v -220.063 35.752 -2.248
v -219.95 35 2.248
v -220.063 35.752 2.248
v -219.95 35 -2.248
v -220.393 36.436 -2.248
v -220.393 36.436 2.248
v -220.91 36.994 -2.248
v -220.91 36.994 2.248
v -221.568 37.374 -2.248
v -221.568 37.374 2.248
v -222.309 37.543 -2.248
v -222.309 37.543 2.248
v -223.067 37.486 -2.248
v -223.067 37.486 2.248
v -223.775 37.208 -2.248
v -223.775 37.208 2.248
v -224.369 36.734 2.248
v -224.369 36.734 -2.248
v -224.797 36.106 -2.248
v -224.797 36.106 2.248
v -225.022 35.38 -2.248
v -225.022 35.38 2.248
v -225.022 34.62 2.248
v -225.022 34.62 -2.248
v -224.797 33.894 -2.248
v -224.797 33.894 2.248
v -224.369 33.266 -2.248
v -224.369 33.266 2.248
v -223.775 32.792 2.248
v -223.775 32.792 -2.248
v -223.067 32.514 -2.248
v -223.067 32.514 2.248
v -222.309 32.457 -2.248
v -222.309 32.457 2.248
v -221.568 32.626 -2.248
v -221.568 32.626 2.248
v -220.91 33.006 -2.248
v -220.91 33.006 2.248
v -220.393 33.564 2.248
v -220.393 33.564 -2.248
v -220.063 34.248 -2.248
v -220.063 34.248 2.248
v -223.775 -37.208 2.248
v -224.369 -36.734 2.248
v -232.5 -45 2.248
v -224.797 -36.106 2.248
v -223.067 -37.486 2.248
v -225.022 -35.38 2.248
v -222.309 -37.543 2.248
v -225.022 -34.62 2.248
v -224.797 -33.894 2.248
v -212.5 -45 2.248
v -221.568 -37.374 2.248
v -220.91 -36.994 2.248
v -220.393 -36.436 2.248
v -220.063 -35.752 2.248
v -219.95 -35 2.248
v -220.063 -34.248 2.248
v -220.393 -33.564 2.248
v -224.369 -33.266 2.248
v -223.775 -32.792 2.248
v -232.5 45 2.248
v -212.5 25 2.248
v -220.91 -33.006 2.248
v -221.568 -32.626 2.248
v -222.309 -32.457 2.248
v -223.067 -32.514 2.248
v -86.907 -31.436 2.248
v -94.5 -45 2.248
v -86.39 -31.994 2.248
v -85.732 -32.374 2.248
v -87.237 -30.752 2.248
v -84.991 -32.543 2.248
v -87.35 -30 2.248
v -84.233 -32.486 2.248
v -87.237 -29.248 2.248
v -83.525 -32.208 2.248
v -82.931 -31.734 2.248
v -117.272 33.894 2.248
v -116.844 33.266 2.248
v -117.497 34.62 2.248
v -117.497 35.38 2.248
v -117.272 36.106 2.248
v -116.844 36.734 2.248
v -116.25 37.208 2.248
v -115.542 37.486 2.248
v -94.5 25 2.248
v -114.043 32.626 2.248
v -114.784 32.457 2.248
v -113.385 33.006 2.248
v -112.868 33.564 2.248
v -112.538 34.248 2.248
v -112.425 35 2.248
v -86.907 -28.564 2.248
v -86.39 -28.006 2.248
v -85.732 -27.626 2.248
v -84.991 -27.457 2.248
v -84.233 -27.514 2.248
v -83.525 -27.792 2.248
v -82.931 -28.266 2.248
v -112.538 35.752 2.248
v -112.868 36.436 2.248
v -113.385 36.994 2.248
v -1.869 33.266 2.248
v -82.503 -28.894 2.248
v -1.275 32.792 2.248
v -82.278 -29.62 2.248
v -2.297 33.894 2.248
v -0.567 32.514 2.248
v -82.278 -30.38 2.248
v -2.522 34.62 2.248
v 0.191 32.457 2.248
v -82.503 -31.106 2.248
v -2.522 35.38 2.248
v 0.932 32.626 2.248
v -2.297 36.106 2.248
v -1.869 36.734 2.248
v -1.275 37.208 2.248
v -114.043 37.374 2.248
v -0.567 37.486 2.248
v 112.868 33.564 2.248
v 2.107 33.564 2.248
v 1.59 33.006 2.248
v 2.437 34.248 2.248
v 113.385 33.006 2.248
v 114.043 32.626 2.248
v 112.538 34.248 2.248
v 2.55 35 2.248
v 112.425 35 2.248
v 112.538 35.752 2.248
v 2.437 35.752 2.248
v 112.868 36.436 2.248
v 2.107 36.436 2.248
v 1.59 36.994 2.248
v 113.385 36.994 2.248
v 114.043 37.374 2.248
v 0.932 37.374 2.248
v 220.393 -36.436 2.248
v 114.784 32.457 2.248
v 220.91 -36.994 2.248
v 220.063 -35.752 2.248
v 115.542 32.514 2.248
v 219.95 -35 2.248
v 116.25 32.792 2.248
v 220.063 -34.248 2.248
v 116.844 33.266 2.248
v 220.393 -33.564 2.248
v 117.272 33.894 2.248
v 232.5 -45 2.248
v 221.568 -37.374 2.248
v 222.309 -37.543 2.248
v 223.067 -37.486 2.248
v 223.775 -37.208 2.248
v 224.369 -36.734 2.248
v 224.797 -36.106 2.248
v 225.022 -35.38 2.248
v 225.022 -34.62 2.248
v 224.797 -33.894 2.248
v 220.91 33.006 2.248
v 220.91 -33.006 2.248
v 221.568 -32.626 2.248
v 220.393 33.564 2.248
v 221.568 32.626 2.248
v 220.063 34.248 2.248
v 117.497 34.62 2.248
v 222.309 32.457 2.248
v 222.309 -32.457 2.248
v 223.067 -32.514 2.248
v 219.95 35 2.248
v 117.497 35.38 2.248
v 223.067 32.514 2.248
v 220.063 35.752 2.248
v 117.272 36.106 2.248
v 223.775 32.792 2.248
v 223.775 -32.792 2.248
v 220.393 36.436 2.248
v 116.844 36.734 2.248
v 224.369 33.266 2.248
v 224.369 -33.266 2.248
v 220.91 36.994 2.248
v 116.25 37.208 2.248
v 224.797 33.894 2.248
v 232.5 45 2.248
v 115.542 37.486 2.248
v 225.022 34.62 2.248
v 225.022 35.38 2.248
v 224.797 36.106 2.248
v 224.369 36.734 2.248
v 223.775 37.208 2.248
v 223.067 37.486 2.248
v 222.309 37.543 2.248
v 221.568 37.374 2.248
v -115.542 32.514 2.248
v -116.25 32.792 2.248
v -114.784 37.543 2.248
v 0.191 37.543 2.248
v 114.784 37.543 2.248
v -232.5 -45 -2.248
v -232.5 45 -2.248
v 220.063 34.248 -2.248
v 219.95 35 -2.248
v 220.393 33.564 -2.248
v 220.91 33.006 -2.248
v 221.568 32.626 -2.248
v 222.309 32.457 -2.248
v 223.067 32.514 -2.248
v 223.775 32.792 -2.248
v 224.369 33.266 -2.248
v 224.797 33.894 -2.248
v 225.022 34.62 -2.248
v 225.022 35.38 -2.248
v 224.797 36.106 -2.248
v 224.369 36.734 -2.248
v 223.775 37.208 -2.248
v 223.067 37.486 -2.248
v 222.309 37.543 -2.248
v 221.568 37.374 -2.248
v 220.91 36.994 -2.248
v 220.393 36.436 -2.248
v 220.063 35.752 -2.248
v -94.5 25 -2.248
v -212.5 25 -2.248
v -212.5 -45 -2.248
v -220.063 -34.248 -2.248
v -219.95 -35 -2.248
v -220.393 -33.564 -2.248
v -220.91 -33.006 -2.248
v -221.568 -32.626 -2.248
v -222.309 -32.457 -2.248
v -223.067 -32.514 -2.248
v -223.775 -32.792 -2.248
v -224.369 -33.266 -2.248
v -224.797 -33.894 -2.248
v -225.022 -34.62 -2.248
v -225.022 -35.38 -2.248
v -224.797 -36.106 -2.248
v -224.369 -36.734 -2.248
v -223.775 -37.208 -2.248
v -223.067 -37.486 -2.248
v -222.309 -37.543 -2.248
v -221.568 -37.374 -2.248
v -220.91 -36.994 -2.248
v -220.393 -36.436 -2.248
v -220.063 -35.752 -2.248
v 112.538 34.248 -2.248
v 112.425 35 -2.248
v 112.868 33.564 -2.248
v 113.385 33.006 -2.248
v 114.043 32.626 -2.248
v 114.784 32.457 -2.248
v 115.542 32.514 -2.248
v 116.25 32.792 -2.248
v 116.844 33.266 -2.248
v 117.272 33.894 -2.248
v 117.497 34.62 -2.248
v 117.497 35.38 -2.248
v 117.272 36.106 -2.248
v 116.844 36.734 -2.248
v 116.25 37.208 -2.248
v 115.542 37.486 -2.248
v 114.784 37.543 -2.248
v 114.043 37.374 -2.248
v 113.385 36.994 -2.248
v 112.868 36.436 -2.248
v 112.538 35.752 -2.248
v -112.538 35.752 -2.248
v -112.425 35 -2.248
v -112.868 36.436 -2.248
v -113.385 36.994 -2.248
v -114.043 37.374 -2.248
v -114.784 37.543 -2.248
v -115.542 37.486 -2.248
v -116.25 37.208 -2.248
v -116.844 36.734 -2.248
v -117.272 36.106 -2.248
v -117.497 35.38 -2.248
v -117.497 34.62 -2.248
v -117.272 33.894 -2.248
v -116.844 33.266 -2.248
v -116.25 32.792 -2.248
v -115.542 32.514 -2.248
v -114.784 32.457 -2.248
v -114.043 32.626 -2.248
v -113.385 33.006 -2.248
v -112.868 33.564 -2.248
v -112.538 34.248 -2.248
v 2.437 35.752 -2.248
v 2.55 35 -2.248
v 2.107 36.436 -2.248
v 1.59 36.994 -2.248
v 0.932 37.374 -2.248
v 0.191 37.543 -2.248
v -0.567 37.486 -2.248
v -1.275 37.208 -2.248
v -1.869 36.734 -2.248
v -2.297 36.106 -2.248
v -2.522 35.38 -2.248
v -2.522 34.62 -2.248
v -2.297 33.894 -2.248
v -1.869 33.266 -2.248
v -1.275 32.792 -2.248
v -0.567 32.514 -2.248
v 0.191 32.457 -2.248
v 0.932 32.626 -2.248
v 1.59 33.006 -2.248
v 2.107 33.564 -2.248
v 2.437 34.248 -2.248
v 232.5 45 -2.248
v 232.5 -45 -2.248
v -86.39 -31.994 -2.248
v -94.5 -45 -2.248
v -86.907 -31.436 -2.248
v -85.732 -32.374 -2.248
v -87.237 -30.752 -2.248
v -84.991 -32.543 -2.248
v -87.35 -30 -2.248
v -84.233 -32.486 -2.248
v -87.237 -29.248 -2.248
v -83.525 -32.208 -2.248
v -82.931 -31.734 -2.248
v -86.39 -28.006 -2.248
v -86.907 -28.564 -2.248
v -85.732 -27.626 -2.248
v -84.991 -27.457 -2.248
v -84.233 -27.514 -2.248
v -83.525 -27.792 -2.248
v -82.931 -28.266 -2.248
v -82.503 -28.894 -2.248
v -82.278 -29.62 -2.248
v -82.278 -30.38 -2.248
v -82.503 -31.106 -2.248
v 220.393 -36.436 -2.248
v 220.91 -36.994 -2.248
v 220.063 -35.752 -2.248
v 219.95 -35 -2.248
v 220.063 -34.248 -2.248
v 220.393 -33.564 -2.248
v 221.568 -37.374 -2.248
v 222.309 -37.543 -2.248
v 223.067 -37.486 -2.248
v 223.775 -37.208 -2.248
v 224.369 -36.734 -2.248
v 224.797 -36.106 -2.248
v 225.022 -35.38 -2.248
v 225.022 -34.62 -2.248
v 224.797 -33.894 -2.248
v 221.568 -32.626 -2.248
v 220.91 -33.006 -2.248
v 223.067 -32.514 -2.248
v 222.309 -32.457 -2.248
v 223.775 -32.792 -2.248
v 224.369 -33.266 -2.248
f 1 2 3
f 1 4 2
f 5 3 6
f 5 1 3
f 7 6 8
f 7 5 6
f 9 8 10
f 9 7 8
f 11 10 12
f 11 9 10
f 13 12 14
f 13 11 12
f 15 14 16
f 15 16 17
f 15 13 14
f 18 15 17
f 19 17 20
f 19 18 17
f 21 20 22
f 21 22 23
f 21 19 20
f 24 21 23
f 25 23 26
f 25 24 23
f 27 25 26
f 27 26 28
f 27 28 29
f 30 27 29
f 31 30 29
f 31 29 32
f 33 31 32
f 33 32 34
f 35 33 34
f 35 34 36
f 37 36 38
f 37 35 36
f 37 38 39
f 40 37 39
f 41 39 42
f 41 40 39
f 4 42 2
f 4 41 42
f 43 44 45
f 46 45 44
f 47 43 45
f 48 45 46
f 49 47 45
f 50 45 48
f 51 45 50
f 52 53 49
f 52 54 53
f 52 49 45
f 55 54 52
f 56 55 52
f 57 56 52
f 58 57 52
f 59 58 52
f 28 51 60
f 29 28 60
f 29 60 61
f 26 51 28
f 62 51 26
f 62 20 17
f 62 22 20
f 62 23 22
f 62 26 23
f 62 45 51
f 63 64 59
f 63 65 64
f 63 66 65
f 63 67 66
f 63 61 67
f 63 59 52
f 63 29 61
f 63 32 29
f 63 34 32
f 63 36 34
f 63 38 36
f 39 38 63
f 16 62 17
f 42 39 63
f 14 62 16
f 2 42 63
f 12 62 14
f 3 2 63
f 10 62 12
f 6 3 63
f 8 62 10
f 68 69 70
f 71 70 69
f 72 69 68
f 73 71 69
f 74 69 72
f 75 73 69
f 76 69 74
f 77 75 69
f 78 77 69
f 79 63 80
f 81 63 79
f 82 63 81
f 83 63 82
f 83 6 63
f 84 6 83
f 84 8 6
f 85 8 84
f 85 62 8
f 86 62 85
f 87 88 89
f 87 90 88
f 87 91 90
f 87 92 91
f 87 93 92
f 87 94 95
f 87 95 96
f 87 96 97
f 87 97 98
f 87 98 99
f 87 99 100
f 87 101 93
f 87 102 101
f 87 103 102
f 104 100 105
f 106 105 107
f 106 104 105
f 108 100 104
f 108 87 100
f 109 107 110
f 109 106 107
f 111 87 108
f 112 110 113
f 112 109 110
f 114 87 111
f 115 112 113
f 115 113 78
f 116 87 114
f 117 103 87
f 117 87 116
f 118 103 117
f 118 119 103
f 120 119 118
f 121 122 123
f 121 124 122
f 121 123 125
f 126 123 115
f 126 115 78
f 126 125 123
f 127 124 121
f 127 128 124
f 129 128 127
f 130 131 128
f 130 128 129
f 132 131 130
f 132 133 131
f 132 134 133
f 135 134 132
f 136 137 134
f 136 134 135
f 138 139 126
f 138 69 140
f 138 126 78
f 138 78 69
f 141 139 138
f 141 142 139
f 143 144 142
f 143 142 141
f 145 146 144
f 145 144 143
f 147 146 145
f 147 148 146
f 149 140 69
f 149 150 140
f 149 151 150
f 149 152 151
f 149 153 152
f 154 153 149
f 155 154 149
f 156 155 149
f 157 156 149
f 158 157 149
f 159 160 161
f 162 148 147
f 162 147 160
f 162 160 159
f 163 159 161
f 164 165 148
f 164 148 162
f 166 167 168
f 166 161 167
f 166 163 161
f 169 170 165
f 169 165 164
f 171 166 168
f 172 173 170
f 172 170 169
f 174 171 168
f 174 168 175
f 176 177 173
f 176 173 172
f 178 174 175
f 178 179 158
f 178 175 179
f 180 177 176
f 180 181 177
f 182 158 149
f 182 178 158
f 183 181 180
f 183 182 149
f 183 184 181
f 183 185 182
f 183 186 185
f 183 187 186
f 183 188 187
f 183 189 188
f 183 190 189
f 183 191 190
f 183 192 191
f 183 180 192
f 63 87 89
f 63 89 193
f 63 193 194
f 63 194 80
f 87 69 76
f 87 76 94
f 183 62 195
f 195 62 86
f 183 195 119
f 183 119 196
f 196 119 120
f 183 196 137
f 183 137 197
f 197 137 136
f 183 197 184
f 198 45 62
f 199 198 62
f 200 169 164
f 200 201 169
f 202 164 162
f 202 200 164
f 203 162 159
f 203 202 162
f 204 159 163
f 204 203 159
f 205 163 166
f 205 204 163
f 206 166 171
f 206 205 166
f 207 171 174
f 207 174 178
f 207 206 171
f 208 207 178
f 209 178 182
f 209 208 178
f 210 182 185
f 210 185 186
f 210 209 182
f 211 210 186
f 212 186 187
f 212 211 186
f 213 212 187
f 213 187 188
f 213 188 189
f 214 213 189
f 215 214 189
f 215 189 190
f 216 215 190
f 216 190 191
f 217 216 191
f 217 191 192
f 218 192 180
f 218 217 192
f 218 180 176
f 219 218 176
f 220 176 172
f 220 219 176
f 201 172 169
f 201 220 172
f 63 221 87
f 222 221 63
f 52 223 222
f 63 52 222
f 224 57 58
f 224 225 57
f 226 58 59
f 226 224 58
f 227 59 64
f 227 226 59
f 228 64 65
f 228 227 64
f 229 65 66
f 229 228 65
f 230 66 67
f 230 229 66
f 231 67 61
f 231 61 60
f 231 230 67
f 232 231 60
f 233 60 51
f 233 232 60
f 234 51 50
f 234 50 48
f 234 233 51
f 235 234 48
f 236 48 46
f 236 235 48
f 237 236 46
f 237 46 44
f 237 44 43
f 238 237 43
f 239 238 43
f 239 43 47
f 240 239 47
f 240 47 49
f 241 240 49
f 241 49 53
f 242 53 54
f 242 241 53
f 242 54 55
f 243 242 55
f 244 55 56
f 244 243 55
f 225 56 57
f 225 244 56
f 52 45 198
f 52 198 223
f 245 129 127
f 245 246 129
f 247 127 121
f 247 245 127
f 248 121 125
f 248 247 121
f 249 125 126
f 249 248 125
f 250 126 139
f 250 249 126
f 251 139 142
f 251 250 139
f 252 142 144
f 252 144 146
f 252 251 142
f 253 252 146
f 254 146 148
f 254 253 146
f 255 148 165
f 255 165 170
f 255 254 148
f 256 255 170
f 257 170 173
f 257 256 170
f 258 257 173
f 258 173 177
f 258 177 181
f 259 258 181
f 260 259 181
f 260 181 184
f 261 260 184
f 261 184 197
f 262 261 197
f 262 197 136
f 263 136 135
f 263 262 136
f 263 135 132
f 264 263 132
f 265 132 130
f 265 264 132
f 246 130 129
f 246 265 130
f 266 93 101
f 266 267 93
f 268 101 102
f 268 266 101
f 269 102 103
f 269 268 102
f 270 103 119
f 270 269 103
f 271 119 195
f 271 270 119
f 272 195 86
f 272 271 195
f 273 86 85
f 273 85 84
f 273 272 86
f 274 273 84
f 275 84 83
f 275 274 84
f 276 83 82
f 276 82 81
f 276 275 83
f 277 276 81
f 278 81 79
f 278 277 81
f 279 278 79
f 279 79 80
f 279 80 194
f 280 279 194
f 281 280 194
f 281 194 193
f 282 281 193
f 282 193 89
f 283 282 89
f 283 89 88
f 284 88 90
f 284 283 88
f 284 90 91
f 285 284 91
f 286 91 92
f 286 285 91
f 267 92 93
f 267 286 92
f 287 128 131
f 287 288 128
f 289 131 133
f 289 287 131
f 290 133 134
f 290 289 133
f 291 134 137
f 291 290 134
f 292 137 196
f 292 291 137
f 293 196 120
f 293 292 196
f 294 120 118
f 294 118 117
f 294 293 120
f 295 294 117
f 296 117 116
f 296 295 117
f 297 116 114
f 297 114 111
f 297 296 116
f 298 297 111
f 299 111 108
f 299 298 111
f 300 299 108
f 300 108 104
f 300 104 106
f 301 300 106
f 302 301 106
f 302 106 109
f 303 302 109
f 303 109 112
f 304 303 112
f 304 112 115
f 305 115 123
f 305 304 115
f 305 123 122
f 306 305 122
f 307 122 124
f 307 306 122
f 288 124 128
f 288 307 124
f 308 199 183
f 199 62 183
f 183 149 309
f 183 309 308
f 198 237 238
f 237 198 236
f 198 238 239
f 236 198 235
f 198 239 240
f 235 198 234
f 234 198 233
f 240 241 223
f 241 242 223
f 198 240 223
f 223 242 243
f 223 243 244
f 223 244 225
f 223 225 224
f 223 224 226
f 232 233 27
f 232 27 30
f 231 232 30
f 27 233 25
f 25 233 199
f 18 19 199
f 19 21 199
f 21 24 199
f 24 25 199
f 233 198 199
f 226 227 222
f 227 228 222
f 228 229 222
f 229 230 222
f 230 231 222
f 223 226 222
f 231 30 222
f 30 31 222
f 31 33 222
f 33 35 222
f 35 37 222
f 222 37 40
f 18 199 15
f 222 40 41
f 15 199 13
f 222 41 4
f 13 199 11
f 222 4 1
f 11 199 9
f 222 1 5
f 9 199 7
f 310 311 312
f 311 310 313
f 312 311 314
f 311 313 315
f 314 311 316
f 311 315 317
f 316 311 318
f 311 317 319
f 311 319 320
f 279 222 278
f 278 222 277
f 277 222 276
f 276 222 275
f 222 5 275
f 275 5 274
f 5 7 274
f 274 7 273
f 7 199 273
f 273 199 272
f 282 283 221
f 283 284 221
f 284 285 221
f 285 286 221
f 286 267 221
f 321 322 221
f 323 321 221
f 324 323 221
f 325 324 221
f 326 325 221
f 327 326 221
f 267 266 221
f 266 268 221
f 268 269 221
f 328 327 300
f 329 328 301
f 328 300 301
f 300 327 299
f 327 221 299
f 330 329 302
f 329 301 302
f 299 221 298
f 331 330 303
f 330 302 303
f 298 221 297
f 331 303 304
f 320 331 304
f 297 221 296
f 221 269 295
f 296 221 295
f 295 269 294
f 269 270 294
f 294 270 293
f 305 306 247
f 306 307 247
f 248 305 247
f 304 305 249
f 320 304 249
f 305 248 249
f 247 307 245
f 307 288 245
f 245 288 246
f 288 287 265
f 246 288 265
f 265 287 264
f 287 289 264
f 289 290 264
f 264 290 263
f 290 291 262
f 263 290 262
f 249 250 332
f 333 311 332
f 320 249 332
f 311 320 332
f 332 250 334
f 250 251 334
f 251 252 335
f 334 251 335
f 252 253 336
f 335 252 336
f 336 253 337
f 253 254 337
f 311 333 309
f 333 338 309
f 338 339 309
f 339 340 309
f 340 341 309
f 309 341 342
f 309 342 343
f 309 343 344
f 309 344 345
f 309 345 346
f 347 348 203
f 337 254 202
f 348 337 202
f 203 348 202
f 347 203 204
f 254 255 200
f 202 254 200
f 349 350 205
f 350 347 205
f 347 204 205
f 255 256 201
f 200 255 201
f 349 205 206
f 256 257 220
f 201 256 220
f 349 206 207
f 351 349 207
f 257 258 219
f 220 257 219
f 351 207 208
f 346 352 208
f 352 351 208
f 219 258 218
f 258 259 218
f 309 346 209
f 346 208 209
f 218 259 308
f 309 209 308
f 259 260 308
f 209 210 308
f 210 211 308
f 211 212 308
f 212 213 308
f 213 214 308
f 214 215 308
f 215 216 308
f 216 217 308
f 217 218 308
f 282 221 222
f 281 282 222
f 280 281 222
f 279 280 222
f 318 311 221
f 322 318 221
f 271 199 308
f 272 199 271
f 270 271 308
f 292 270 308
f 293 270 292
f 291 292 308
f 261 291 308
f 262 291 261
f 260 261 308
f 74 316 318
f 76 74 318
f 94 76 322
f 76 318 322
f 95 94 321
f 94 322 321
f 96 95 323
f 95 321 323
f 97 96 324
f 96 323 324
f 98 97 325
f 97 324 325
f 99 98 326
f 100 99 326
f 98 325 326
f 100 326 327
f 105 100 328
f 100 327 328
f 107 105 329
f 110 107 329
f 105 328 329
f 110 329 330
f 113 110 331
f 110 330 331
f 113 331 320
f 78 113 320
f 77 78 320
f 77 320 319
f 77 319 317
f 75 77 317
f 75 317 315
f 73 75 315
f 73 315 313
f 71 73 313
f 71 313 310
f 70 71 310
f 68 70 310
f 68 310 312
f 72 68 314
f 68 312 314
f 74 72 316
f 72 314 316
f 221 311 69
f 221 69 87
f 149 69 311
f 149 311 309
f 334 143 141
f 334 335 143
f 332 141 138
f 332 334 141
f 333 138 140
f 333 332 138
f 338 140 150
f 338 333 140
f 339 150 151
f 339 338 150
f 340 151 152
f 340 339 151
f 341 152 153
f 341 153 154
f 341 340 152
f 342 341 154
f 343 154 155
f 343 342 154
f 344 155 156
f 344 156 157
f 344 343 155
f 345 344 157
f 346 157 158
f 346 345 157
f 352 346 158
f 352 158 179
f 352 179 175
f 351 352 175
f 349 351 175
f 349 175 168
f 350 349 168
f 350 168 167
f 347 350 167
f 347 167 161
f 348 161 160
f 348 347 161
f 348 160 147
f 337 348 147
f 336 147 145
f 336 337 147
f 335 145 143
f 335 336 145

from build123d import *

# Parameters (mm, degrees)
SKETCH1_W           = 465
SKETCH1_H           = 90
SKETCH1_R           = 2.55
BOSS_EXTRUDE1_DEPTH = 2.2479
SKETCH5_W           = 118
SKETCH5_H           = 70
CUT_EXTRUDE2_DEPTH  = 237.85747237
SKETCH7_R           = 2.55
CUT_EXTRUDE3_DEPTH  = 4.4958


with BuildPart() as part:
    # Sketch1 → Boss-Extrude1 (new, symmetric)
    with BuildSketch(Plane.XY):
        Rectangle(SKETCH1_W, SKETCH1_H)
        with Locations((-222.5, 35)):
            Circle(SKETCH1_R, mode=Mode.SUBTRACT)
        with Locations((-222.5, -35)):
            Circle(SKETCH1_R, mode=Mode.SUBTRACT)
        with Locations((0, 35)):
            Circle(SKETCH1_R, mode=Mode.SUBTRACT)
        with Locations((-114.975, 35)):
            Circle(SKETCH1_R, mode=Mode.SUBTRACT)
        with Locations(Location((222.5, -35, 0), (0, 0, 180))):
            Circle(SKETCH1_R, mode=Mode.SUBTRACT)
        with Locations(Location((222.5, 35, 0), (0, 0, 180))):
            Circle(SKETCH1_R, mode=Mode.SUBTRACT)
        with Locations(Location((114.975, 35, 0), (0, 0, 180))):
            Circle(SKETCH1_R, mode=Mode.SUBTRACT)
    extrude(amount=BOSS_EXTRUDE1_DEPTH, both=True)

    # Sketch5 → Cut-Extrude2 (cut, through all)
    with BuildSketch(Plane(origin=(0, 0, -2.2479), x_dir=(-1, 0, 0), z_dir=(0, 0, -1))):
        with Locations((153.5, -10)):
            Rectangle(SKETCH5_W, SKETCH5_H)
    extrude(amount=-CUT_EXTRUDE2_DEPTH, mode=Mode.SUBTRACT)

    # Sketch7 → Cut-Extrude3 (cut)
    with BuildSketch(Plane(origin=(0, 0, -2.2479), x_dir=(-1, 0, 0), z_dir=(0, 0, -1))):
        with Locations((84.8, -30)):
            Circle(SKETCH7_R)
    extrude(amount=-CUT_EXTRUDE3_DEPTH, mode=Mode.SUBTRACT)


solid = part.part
